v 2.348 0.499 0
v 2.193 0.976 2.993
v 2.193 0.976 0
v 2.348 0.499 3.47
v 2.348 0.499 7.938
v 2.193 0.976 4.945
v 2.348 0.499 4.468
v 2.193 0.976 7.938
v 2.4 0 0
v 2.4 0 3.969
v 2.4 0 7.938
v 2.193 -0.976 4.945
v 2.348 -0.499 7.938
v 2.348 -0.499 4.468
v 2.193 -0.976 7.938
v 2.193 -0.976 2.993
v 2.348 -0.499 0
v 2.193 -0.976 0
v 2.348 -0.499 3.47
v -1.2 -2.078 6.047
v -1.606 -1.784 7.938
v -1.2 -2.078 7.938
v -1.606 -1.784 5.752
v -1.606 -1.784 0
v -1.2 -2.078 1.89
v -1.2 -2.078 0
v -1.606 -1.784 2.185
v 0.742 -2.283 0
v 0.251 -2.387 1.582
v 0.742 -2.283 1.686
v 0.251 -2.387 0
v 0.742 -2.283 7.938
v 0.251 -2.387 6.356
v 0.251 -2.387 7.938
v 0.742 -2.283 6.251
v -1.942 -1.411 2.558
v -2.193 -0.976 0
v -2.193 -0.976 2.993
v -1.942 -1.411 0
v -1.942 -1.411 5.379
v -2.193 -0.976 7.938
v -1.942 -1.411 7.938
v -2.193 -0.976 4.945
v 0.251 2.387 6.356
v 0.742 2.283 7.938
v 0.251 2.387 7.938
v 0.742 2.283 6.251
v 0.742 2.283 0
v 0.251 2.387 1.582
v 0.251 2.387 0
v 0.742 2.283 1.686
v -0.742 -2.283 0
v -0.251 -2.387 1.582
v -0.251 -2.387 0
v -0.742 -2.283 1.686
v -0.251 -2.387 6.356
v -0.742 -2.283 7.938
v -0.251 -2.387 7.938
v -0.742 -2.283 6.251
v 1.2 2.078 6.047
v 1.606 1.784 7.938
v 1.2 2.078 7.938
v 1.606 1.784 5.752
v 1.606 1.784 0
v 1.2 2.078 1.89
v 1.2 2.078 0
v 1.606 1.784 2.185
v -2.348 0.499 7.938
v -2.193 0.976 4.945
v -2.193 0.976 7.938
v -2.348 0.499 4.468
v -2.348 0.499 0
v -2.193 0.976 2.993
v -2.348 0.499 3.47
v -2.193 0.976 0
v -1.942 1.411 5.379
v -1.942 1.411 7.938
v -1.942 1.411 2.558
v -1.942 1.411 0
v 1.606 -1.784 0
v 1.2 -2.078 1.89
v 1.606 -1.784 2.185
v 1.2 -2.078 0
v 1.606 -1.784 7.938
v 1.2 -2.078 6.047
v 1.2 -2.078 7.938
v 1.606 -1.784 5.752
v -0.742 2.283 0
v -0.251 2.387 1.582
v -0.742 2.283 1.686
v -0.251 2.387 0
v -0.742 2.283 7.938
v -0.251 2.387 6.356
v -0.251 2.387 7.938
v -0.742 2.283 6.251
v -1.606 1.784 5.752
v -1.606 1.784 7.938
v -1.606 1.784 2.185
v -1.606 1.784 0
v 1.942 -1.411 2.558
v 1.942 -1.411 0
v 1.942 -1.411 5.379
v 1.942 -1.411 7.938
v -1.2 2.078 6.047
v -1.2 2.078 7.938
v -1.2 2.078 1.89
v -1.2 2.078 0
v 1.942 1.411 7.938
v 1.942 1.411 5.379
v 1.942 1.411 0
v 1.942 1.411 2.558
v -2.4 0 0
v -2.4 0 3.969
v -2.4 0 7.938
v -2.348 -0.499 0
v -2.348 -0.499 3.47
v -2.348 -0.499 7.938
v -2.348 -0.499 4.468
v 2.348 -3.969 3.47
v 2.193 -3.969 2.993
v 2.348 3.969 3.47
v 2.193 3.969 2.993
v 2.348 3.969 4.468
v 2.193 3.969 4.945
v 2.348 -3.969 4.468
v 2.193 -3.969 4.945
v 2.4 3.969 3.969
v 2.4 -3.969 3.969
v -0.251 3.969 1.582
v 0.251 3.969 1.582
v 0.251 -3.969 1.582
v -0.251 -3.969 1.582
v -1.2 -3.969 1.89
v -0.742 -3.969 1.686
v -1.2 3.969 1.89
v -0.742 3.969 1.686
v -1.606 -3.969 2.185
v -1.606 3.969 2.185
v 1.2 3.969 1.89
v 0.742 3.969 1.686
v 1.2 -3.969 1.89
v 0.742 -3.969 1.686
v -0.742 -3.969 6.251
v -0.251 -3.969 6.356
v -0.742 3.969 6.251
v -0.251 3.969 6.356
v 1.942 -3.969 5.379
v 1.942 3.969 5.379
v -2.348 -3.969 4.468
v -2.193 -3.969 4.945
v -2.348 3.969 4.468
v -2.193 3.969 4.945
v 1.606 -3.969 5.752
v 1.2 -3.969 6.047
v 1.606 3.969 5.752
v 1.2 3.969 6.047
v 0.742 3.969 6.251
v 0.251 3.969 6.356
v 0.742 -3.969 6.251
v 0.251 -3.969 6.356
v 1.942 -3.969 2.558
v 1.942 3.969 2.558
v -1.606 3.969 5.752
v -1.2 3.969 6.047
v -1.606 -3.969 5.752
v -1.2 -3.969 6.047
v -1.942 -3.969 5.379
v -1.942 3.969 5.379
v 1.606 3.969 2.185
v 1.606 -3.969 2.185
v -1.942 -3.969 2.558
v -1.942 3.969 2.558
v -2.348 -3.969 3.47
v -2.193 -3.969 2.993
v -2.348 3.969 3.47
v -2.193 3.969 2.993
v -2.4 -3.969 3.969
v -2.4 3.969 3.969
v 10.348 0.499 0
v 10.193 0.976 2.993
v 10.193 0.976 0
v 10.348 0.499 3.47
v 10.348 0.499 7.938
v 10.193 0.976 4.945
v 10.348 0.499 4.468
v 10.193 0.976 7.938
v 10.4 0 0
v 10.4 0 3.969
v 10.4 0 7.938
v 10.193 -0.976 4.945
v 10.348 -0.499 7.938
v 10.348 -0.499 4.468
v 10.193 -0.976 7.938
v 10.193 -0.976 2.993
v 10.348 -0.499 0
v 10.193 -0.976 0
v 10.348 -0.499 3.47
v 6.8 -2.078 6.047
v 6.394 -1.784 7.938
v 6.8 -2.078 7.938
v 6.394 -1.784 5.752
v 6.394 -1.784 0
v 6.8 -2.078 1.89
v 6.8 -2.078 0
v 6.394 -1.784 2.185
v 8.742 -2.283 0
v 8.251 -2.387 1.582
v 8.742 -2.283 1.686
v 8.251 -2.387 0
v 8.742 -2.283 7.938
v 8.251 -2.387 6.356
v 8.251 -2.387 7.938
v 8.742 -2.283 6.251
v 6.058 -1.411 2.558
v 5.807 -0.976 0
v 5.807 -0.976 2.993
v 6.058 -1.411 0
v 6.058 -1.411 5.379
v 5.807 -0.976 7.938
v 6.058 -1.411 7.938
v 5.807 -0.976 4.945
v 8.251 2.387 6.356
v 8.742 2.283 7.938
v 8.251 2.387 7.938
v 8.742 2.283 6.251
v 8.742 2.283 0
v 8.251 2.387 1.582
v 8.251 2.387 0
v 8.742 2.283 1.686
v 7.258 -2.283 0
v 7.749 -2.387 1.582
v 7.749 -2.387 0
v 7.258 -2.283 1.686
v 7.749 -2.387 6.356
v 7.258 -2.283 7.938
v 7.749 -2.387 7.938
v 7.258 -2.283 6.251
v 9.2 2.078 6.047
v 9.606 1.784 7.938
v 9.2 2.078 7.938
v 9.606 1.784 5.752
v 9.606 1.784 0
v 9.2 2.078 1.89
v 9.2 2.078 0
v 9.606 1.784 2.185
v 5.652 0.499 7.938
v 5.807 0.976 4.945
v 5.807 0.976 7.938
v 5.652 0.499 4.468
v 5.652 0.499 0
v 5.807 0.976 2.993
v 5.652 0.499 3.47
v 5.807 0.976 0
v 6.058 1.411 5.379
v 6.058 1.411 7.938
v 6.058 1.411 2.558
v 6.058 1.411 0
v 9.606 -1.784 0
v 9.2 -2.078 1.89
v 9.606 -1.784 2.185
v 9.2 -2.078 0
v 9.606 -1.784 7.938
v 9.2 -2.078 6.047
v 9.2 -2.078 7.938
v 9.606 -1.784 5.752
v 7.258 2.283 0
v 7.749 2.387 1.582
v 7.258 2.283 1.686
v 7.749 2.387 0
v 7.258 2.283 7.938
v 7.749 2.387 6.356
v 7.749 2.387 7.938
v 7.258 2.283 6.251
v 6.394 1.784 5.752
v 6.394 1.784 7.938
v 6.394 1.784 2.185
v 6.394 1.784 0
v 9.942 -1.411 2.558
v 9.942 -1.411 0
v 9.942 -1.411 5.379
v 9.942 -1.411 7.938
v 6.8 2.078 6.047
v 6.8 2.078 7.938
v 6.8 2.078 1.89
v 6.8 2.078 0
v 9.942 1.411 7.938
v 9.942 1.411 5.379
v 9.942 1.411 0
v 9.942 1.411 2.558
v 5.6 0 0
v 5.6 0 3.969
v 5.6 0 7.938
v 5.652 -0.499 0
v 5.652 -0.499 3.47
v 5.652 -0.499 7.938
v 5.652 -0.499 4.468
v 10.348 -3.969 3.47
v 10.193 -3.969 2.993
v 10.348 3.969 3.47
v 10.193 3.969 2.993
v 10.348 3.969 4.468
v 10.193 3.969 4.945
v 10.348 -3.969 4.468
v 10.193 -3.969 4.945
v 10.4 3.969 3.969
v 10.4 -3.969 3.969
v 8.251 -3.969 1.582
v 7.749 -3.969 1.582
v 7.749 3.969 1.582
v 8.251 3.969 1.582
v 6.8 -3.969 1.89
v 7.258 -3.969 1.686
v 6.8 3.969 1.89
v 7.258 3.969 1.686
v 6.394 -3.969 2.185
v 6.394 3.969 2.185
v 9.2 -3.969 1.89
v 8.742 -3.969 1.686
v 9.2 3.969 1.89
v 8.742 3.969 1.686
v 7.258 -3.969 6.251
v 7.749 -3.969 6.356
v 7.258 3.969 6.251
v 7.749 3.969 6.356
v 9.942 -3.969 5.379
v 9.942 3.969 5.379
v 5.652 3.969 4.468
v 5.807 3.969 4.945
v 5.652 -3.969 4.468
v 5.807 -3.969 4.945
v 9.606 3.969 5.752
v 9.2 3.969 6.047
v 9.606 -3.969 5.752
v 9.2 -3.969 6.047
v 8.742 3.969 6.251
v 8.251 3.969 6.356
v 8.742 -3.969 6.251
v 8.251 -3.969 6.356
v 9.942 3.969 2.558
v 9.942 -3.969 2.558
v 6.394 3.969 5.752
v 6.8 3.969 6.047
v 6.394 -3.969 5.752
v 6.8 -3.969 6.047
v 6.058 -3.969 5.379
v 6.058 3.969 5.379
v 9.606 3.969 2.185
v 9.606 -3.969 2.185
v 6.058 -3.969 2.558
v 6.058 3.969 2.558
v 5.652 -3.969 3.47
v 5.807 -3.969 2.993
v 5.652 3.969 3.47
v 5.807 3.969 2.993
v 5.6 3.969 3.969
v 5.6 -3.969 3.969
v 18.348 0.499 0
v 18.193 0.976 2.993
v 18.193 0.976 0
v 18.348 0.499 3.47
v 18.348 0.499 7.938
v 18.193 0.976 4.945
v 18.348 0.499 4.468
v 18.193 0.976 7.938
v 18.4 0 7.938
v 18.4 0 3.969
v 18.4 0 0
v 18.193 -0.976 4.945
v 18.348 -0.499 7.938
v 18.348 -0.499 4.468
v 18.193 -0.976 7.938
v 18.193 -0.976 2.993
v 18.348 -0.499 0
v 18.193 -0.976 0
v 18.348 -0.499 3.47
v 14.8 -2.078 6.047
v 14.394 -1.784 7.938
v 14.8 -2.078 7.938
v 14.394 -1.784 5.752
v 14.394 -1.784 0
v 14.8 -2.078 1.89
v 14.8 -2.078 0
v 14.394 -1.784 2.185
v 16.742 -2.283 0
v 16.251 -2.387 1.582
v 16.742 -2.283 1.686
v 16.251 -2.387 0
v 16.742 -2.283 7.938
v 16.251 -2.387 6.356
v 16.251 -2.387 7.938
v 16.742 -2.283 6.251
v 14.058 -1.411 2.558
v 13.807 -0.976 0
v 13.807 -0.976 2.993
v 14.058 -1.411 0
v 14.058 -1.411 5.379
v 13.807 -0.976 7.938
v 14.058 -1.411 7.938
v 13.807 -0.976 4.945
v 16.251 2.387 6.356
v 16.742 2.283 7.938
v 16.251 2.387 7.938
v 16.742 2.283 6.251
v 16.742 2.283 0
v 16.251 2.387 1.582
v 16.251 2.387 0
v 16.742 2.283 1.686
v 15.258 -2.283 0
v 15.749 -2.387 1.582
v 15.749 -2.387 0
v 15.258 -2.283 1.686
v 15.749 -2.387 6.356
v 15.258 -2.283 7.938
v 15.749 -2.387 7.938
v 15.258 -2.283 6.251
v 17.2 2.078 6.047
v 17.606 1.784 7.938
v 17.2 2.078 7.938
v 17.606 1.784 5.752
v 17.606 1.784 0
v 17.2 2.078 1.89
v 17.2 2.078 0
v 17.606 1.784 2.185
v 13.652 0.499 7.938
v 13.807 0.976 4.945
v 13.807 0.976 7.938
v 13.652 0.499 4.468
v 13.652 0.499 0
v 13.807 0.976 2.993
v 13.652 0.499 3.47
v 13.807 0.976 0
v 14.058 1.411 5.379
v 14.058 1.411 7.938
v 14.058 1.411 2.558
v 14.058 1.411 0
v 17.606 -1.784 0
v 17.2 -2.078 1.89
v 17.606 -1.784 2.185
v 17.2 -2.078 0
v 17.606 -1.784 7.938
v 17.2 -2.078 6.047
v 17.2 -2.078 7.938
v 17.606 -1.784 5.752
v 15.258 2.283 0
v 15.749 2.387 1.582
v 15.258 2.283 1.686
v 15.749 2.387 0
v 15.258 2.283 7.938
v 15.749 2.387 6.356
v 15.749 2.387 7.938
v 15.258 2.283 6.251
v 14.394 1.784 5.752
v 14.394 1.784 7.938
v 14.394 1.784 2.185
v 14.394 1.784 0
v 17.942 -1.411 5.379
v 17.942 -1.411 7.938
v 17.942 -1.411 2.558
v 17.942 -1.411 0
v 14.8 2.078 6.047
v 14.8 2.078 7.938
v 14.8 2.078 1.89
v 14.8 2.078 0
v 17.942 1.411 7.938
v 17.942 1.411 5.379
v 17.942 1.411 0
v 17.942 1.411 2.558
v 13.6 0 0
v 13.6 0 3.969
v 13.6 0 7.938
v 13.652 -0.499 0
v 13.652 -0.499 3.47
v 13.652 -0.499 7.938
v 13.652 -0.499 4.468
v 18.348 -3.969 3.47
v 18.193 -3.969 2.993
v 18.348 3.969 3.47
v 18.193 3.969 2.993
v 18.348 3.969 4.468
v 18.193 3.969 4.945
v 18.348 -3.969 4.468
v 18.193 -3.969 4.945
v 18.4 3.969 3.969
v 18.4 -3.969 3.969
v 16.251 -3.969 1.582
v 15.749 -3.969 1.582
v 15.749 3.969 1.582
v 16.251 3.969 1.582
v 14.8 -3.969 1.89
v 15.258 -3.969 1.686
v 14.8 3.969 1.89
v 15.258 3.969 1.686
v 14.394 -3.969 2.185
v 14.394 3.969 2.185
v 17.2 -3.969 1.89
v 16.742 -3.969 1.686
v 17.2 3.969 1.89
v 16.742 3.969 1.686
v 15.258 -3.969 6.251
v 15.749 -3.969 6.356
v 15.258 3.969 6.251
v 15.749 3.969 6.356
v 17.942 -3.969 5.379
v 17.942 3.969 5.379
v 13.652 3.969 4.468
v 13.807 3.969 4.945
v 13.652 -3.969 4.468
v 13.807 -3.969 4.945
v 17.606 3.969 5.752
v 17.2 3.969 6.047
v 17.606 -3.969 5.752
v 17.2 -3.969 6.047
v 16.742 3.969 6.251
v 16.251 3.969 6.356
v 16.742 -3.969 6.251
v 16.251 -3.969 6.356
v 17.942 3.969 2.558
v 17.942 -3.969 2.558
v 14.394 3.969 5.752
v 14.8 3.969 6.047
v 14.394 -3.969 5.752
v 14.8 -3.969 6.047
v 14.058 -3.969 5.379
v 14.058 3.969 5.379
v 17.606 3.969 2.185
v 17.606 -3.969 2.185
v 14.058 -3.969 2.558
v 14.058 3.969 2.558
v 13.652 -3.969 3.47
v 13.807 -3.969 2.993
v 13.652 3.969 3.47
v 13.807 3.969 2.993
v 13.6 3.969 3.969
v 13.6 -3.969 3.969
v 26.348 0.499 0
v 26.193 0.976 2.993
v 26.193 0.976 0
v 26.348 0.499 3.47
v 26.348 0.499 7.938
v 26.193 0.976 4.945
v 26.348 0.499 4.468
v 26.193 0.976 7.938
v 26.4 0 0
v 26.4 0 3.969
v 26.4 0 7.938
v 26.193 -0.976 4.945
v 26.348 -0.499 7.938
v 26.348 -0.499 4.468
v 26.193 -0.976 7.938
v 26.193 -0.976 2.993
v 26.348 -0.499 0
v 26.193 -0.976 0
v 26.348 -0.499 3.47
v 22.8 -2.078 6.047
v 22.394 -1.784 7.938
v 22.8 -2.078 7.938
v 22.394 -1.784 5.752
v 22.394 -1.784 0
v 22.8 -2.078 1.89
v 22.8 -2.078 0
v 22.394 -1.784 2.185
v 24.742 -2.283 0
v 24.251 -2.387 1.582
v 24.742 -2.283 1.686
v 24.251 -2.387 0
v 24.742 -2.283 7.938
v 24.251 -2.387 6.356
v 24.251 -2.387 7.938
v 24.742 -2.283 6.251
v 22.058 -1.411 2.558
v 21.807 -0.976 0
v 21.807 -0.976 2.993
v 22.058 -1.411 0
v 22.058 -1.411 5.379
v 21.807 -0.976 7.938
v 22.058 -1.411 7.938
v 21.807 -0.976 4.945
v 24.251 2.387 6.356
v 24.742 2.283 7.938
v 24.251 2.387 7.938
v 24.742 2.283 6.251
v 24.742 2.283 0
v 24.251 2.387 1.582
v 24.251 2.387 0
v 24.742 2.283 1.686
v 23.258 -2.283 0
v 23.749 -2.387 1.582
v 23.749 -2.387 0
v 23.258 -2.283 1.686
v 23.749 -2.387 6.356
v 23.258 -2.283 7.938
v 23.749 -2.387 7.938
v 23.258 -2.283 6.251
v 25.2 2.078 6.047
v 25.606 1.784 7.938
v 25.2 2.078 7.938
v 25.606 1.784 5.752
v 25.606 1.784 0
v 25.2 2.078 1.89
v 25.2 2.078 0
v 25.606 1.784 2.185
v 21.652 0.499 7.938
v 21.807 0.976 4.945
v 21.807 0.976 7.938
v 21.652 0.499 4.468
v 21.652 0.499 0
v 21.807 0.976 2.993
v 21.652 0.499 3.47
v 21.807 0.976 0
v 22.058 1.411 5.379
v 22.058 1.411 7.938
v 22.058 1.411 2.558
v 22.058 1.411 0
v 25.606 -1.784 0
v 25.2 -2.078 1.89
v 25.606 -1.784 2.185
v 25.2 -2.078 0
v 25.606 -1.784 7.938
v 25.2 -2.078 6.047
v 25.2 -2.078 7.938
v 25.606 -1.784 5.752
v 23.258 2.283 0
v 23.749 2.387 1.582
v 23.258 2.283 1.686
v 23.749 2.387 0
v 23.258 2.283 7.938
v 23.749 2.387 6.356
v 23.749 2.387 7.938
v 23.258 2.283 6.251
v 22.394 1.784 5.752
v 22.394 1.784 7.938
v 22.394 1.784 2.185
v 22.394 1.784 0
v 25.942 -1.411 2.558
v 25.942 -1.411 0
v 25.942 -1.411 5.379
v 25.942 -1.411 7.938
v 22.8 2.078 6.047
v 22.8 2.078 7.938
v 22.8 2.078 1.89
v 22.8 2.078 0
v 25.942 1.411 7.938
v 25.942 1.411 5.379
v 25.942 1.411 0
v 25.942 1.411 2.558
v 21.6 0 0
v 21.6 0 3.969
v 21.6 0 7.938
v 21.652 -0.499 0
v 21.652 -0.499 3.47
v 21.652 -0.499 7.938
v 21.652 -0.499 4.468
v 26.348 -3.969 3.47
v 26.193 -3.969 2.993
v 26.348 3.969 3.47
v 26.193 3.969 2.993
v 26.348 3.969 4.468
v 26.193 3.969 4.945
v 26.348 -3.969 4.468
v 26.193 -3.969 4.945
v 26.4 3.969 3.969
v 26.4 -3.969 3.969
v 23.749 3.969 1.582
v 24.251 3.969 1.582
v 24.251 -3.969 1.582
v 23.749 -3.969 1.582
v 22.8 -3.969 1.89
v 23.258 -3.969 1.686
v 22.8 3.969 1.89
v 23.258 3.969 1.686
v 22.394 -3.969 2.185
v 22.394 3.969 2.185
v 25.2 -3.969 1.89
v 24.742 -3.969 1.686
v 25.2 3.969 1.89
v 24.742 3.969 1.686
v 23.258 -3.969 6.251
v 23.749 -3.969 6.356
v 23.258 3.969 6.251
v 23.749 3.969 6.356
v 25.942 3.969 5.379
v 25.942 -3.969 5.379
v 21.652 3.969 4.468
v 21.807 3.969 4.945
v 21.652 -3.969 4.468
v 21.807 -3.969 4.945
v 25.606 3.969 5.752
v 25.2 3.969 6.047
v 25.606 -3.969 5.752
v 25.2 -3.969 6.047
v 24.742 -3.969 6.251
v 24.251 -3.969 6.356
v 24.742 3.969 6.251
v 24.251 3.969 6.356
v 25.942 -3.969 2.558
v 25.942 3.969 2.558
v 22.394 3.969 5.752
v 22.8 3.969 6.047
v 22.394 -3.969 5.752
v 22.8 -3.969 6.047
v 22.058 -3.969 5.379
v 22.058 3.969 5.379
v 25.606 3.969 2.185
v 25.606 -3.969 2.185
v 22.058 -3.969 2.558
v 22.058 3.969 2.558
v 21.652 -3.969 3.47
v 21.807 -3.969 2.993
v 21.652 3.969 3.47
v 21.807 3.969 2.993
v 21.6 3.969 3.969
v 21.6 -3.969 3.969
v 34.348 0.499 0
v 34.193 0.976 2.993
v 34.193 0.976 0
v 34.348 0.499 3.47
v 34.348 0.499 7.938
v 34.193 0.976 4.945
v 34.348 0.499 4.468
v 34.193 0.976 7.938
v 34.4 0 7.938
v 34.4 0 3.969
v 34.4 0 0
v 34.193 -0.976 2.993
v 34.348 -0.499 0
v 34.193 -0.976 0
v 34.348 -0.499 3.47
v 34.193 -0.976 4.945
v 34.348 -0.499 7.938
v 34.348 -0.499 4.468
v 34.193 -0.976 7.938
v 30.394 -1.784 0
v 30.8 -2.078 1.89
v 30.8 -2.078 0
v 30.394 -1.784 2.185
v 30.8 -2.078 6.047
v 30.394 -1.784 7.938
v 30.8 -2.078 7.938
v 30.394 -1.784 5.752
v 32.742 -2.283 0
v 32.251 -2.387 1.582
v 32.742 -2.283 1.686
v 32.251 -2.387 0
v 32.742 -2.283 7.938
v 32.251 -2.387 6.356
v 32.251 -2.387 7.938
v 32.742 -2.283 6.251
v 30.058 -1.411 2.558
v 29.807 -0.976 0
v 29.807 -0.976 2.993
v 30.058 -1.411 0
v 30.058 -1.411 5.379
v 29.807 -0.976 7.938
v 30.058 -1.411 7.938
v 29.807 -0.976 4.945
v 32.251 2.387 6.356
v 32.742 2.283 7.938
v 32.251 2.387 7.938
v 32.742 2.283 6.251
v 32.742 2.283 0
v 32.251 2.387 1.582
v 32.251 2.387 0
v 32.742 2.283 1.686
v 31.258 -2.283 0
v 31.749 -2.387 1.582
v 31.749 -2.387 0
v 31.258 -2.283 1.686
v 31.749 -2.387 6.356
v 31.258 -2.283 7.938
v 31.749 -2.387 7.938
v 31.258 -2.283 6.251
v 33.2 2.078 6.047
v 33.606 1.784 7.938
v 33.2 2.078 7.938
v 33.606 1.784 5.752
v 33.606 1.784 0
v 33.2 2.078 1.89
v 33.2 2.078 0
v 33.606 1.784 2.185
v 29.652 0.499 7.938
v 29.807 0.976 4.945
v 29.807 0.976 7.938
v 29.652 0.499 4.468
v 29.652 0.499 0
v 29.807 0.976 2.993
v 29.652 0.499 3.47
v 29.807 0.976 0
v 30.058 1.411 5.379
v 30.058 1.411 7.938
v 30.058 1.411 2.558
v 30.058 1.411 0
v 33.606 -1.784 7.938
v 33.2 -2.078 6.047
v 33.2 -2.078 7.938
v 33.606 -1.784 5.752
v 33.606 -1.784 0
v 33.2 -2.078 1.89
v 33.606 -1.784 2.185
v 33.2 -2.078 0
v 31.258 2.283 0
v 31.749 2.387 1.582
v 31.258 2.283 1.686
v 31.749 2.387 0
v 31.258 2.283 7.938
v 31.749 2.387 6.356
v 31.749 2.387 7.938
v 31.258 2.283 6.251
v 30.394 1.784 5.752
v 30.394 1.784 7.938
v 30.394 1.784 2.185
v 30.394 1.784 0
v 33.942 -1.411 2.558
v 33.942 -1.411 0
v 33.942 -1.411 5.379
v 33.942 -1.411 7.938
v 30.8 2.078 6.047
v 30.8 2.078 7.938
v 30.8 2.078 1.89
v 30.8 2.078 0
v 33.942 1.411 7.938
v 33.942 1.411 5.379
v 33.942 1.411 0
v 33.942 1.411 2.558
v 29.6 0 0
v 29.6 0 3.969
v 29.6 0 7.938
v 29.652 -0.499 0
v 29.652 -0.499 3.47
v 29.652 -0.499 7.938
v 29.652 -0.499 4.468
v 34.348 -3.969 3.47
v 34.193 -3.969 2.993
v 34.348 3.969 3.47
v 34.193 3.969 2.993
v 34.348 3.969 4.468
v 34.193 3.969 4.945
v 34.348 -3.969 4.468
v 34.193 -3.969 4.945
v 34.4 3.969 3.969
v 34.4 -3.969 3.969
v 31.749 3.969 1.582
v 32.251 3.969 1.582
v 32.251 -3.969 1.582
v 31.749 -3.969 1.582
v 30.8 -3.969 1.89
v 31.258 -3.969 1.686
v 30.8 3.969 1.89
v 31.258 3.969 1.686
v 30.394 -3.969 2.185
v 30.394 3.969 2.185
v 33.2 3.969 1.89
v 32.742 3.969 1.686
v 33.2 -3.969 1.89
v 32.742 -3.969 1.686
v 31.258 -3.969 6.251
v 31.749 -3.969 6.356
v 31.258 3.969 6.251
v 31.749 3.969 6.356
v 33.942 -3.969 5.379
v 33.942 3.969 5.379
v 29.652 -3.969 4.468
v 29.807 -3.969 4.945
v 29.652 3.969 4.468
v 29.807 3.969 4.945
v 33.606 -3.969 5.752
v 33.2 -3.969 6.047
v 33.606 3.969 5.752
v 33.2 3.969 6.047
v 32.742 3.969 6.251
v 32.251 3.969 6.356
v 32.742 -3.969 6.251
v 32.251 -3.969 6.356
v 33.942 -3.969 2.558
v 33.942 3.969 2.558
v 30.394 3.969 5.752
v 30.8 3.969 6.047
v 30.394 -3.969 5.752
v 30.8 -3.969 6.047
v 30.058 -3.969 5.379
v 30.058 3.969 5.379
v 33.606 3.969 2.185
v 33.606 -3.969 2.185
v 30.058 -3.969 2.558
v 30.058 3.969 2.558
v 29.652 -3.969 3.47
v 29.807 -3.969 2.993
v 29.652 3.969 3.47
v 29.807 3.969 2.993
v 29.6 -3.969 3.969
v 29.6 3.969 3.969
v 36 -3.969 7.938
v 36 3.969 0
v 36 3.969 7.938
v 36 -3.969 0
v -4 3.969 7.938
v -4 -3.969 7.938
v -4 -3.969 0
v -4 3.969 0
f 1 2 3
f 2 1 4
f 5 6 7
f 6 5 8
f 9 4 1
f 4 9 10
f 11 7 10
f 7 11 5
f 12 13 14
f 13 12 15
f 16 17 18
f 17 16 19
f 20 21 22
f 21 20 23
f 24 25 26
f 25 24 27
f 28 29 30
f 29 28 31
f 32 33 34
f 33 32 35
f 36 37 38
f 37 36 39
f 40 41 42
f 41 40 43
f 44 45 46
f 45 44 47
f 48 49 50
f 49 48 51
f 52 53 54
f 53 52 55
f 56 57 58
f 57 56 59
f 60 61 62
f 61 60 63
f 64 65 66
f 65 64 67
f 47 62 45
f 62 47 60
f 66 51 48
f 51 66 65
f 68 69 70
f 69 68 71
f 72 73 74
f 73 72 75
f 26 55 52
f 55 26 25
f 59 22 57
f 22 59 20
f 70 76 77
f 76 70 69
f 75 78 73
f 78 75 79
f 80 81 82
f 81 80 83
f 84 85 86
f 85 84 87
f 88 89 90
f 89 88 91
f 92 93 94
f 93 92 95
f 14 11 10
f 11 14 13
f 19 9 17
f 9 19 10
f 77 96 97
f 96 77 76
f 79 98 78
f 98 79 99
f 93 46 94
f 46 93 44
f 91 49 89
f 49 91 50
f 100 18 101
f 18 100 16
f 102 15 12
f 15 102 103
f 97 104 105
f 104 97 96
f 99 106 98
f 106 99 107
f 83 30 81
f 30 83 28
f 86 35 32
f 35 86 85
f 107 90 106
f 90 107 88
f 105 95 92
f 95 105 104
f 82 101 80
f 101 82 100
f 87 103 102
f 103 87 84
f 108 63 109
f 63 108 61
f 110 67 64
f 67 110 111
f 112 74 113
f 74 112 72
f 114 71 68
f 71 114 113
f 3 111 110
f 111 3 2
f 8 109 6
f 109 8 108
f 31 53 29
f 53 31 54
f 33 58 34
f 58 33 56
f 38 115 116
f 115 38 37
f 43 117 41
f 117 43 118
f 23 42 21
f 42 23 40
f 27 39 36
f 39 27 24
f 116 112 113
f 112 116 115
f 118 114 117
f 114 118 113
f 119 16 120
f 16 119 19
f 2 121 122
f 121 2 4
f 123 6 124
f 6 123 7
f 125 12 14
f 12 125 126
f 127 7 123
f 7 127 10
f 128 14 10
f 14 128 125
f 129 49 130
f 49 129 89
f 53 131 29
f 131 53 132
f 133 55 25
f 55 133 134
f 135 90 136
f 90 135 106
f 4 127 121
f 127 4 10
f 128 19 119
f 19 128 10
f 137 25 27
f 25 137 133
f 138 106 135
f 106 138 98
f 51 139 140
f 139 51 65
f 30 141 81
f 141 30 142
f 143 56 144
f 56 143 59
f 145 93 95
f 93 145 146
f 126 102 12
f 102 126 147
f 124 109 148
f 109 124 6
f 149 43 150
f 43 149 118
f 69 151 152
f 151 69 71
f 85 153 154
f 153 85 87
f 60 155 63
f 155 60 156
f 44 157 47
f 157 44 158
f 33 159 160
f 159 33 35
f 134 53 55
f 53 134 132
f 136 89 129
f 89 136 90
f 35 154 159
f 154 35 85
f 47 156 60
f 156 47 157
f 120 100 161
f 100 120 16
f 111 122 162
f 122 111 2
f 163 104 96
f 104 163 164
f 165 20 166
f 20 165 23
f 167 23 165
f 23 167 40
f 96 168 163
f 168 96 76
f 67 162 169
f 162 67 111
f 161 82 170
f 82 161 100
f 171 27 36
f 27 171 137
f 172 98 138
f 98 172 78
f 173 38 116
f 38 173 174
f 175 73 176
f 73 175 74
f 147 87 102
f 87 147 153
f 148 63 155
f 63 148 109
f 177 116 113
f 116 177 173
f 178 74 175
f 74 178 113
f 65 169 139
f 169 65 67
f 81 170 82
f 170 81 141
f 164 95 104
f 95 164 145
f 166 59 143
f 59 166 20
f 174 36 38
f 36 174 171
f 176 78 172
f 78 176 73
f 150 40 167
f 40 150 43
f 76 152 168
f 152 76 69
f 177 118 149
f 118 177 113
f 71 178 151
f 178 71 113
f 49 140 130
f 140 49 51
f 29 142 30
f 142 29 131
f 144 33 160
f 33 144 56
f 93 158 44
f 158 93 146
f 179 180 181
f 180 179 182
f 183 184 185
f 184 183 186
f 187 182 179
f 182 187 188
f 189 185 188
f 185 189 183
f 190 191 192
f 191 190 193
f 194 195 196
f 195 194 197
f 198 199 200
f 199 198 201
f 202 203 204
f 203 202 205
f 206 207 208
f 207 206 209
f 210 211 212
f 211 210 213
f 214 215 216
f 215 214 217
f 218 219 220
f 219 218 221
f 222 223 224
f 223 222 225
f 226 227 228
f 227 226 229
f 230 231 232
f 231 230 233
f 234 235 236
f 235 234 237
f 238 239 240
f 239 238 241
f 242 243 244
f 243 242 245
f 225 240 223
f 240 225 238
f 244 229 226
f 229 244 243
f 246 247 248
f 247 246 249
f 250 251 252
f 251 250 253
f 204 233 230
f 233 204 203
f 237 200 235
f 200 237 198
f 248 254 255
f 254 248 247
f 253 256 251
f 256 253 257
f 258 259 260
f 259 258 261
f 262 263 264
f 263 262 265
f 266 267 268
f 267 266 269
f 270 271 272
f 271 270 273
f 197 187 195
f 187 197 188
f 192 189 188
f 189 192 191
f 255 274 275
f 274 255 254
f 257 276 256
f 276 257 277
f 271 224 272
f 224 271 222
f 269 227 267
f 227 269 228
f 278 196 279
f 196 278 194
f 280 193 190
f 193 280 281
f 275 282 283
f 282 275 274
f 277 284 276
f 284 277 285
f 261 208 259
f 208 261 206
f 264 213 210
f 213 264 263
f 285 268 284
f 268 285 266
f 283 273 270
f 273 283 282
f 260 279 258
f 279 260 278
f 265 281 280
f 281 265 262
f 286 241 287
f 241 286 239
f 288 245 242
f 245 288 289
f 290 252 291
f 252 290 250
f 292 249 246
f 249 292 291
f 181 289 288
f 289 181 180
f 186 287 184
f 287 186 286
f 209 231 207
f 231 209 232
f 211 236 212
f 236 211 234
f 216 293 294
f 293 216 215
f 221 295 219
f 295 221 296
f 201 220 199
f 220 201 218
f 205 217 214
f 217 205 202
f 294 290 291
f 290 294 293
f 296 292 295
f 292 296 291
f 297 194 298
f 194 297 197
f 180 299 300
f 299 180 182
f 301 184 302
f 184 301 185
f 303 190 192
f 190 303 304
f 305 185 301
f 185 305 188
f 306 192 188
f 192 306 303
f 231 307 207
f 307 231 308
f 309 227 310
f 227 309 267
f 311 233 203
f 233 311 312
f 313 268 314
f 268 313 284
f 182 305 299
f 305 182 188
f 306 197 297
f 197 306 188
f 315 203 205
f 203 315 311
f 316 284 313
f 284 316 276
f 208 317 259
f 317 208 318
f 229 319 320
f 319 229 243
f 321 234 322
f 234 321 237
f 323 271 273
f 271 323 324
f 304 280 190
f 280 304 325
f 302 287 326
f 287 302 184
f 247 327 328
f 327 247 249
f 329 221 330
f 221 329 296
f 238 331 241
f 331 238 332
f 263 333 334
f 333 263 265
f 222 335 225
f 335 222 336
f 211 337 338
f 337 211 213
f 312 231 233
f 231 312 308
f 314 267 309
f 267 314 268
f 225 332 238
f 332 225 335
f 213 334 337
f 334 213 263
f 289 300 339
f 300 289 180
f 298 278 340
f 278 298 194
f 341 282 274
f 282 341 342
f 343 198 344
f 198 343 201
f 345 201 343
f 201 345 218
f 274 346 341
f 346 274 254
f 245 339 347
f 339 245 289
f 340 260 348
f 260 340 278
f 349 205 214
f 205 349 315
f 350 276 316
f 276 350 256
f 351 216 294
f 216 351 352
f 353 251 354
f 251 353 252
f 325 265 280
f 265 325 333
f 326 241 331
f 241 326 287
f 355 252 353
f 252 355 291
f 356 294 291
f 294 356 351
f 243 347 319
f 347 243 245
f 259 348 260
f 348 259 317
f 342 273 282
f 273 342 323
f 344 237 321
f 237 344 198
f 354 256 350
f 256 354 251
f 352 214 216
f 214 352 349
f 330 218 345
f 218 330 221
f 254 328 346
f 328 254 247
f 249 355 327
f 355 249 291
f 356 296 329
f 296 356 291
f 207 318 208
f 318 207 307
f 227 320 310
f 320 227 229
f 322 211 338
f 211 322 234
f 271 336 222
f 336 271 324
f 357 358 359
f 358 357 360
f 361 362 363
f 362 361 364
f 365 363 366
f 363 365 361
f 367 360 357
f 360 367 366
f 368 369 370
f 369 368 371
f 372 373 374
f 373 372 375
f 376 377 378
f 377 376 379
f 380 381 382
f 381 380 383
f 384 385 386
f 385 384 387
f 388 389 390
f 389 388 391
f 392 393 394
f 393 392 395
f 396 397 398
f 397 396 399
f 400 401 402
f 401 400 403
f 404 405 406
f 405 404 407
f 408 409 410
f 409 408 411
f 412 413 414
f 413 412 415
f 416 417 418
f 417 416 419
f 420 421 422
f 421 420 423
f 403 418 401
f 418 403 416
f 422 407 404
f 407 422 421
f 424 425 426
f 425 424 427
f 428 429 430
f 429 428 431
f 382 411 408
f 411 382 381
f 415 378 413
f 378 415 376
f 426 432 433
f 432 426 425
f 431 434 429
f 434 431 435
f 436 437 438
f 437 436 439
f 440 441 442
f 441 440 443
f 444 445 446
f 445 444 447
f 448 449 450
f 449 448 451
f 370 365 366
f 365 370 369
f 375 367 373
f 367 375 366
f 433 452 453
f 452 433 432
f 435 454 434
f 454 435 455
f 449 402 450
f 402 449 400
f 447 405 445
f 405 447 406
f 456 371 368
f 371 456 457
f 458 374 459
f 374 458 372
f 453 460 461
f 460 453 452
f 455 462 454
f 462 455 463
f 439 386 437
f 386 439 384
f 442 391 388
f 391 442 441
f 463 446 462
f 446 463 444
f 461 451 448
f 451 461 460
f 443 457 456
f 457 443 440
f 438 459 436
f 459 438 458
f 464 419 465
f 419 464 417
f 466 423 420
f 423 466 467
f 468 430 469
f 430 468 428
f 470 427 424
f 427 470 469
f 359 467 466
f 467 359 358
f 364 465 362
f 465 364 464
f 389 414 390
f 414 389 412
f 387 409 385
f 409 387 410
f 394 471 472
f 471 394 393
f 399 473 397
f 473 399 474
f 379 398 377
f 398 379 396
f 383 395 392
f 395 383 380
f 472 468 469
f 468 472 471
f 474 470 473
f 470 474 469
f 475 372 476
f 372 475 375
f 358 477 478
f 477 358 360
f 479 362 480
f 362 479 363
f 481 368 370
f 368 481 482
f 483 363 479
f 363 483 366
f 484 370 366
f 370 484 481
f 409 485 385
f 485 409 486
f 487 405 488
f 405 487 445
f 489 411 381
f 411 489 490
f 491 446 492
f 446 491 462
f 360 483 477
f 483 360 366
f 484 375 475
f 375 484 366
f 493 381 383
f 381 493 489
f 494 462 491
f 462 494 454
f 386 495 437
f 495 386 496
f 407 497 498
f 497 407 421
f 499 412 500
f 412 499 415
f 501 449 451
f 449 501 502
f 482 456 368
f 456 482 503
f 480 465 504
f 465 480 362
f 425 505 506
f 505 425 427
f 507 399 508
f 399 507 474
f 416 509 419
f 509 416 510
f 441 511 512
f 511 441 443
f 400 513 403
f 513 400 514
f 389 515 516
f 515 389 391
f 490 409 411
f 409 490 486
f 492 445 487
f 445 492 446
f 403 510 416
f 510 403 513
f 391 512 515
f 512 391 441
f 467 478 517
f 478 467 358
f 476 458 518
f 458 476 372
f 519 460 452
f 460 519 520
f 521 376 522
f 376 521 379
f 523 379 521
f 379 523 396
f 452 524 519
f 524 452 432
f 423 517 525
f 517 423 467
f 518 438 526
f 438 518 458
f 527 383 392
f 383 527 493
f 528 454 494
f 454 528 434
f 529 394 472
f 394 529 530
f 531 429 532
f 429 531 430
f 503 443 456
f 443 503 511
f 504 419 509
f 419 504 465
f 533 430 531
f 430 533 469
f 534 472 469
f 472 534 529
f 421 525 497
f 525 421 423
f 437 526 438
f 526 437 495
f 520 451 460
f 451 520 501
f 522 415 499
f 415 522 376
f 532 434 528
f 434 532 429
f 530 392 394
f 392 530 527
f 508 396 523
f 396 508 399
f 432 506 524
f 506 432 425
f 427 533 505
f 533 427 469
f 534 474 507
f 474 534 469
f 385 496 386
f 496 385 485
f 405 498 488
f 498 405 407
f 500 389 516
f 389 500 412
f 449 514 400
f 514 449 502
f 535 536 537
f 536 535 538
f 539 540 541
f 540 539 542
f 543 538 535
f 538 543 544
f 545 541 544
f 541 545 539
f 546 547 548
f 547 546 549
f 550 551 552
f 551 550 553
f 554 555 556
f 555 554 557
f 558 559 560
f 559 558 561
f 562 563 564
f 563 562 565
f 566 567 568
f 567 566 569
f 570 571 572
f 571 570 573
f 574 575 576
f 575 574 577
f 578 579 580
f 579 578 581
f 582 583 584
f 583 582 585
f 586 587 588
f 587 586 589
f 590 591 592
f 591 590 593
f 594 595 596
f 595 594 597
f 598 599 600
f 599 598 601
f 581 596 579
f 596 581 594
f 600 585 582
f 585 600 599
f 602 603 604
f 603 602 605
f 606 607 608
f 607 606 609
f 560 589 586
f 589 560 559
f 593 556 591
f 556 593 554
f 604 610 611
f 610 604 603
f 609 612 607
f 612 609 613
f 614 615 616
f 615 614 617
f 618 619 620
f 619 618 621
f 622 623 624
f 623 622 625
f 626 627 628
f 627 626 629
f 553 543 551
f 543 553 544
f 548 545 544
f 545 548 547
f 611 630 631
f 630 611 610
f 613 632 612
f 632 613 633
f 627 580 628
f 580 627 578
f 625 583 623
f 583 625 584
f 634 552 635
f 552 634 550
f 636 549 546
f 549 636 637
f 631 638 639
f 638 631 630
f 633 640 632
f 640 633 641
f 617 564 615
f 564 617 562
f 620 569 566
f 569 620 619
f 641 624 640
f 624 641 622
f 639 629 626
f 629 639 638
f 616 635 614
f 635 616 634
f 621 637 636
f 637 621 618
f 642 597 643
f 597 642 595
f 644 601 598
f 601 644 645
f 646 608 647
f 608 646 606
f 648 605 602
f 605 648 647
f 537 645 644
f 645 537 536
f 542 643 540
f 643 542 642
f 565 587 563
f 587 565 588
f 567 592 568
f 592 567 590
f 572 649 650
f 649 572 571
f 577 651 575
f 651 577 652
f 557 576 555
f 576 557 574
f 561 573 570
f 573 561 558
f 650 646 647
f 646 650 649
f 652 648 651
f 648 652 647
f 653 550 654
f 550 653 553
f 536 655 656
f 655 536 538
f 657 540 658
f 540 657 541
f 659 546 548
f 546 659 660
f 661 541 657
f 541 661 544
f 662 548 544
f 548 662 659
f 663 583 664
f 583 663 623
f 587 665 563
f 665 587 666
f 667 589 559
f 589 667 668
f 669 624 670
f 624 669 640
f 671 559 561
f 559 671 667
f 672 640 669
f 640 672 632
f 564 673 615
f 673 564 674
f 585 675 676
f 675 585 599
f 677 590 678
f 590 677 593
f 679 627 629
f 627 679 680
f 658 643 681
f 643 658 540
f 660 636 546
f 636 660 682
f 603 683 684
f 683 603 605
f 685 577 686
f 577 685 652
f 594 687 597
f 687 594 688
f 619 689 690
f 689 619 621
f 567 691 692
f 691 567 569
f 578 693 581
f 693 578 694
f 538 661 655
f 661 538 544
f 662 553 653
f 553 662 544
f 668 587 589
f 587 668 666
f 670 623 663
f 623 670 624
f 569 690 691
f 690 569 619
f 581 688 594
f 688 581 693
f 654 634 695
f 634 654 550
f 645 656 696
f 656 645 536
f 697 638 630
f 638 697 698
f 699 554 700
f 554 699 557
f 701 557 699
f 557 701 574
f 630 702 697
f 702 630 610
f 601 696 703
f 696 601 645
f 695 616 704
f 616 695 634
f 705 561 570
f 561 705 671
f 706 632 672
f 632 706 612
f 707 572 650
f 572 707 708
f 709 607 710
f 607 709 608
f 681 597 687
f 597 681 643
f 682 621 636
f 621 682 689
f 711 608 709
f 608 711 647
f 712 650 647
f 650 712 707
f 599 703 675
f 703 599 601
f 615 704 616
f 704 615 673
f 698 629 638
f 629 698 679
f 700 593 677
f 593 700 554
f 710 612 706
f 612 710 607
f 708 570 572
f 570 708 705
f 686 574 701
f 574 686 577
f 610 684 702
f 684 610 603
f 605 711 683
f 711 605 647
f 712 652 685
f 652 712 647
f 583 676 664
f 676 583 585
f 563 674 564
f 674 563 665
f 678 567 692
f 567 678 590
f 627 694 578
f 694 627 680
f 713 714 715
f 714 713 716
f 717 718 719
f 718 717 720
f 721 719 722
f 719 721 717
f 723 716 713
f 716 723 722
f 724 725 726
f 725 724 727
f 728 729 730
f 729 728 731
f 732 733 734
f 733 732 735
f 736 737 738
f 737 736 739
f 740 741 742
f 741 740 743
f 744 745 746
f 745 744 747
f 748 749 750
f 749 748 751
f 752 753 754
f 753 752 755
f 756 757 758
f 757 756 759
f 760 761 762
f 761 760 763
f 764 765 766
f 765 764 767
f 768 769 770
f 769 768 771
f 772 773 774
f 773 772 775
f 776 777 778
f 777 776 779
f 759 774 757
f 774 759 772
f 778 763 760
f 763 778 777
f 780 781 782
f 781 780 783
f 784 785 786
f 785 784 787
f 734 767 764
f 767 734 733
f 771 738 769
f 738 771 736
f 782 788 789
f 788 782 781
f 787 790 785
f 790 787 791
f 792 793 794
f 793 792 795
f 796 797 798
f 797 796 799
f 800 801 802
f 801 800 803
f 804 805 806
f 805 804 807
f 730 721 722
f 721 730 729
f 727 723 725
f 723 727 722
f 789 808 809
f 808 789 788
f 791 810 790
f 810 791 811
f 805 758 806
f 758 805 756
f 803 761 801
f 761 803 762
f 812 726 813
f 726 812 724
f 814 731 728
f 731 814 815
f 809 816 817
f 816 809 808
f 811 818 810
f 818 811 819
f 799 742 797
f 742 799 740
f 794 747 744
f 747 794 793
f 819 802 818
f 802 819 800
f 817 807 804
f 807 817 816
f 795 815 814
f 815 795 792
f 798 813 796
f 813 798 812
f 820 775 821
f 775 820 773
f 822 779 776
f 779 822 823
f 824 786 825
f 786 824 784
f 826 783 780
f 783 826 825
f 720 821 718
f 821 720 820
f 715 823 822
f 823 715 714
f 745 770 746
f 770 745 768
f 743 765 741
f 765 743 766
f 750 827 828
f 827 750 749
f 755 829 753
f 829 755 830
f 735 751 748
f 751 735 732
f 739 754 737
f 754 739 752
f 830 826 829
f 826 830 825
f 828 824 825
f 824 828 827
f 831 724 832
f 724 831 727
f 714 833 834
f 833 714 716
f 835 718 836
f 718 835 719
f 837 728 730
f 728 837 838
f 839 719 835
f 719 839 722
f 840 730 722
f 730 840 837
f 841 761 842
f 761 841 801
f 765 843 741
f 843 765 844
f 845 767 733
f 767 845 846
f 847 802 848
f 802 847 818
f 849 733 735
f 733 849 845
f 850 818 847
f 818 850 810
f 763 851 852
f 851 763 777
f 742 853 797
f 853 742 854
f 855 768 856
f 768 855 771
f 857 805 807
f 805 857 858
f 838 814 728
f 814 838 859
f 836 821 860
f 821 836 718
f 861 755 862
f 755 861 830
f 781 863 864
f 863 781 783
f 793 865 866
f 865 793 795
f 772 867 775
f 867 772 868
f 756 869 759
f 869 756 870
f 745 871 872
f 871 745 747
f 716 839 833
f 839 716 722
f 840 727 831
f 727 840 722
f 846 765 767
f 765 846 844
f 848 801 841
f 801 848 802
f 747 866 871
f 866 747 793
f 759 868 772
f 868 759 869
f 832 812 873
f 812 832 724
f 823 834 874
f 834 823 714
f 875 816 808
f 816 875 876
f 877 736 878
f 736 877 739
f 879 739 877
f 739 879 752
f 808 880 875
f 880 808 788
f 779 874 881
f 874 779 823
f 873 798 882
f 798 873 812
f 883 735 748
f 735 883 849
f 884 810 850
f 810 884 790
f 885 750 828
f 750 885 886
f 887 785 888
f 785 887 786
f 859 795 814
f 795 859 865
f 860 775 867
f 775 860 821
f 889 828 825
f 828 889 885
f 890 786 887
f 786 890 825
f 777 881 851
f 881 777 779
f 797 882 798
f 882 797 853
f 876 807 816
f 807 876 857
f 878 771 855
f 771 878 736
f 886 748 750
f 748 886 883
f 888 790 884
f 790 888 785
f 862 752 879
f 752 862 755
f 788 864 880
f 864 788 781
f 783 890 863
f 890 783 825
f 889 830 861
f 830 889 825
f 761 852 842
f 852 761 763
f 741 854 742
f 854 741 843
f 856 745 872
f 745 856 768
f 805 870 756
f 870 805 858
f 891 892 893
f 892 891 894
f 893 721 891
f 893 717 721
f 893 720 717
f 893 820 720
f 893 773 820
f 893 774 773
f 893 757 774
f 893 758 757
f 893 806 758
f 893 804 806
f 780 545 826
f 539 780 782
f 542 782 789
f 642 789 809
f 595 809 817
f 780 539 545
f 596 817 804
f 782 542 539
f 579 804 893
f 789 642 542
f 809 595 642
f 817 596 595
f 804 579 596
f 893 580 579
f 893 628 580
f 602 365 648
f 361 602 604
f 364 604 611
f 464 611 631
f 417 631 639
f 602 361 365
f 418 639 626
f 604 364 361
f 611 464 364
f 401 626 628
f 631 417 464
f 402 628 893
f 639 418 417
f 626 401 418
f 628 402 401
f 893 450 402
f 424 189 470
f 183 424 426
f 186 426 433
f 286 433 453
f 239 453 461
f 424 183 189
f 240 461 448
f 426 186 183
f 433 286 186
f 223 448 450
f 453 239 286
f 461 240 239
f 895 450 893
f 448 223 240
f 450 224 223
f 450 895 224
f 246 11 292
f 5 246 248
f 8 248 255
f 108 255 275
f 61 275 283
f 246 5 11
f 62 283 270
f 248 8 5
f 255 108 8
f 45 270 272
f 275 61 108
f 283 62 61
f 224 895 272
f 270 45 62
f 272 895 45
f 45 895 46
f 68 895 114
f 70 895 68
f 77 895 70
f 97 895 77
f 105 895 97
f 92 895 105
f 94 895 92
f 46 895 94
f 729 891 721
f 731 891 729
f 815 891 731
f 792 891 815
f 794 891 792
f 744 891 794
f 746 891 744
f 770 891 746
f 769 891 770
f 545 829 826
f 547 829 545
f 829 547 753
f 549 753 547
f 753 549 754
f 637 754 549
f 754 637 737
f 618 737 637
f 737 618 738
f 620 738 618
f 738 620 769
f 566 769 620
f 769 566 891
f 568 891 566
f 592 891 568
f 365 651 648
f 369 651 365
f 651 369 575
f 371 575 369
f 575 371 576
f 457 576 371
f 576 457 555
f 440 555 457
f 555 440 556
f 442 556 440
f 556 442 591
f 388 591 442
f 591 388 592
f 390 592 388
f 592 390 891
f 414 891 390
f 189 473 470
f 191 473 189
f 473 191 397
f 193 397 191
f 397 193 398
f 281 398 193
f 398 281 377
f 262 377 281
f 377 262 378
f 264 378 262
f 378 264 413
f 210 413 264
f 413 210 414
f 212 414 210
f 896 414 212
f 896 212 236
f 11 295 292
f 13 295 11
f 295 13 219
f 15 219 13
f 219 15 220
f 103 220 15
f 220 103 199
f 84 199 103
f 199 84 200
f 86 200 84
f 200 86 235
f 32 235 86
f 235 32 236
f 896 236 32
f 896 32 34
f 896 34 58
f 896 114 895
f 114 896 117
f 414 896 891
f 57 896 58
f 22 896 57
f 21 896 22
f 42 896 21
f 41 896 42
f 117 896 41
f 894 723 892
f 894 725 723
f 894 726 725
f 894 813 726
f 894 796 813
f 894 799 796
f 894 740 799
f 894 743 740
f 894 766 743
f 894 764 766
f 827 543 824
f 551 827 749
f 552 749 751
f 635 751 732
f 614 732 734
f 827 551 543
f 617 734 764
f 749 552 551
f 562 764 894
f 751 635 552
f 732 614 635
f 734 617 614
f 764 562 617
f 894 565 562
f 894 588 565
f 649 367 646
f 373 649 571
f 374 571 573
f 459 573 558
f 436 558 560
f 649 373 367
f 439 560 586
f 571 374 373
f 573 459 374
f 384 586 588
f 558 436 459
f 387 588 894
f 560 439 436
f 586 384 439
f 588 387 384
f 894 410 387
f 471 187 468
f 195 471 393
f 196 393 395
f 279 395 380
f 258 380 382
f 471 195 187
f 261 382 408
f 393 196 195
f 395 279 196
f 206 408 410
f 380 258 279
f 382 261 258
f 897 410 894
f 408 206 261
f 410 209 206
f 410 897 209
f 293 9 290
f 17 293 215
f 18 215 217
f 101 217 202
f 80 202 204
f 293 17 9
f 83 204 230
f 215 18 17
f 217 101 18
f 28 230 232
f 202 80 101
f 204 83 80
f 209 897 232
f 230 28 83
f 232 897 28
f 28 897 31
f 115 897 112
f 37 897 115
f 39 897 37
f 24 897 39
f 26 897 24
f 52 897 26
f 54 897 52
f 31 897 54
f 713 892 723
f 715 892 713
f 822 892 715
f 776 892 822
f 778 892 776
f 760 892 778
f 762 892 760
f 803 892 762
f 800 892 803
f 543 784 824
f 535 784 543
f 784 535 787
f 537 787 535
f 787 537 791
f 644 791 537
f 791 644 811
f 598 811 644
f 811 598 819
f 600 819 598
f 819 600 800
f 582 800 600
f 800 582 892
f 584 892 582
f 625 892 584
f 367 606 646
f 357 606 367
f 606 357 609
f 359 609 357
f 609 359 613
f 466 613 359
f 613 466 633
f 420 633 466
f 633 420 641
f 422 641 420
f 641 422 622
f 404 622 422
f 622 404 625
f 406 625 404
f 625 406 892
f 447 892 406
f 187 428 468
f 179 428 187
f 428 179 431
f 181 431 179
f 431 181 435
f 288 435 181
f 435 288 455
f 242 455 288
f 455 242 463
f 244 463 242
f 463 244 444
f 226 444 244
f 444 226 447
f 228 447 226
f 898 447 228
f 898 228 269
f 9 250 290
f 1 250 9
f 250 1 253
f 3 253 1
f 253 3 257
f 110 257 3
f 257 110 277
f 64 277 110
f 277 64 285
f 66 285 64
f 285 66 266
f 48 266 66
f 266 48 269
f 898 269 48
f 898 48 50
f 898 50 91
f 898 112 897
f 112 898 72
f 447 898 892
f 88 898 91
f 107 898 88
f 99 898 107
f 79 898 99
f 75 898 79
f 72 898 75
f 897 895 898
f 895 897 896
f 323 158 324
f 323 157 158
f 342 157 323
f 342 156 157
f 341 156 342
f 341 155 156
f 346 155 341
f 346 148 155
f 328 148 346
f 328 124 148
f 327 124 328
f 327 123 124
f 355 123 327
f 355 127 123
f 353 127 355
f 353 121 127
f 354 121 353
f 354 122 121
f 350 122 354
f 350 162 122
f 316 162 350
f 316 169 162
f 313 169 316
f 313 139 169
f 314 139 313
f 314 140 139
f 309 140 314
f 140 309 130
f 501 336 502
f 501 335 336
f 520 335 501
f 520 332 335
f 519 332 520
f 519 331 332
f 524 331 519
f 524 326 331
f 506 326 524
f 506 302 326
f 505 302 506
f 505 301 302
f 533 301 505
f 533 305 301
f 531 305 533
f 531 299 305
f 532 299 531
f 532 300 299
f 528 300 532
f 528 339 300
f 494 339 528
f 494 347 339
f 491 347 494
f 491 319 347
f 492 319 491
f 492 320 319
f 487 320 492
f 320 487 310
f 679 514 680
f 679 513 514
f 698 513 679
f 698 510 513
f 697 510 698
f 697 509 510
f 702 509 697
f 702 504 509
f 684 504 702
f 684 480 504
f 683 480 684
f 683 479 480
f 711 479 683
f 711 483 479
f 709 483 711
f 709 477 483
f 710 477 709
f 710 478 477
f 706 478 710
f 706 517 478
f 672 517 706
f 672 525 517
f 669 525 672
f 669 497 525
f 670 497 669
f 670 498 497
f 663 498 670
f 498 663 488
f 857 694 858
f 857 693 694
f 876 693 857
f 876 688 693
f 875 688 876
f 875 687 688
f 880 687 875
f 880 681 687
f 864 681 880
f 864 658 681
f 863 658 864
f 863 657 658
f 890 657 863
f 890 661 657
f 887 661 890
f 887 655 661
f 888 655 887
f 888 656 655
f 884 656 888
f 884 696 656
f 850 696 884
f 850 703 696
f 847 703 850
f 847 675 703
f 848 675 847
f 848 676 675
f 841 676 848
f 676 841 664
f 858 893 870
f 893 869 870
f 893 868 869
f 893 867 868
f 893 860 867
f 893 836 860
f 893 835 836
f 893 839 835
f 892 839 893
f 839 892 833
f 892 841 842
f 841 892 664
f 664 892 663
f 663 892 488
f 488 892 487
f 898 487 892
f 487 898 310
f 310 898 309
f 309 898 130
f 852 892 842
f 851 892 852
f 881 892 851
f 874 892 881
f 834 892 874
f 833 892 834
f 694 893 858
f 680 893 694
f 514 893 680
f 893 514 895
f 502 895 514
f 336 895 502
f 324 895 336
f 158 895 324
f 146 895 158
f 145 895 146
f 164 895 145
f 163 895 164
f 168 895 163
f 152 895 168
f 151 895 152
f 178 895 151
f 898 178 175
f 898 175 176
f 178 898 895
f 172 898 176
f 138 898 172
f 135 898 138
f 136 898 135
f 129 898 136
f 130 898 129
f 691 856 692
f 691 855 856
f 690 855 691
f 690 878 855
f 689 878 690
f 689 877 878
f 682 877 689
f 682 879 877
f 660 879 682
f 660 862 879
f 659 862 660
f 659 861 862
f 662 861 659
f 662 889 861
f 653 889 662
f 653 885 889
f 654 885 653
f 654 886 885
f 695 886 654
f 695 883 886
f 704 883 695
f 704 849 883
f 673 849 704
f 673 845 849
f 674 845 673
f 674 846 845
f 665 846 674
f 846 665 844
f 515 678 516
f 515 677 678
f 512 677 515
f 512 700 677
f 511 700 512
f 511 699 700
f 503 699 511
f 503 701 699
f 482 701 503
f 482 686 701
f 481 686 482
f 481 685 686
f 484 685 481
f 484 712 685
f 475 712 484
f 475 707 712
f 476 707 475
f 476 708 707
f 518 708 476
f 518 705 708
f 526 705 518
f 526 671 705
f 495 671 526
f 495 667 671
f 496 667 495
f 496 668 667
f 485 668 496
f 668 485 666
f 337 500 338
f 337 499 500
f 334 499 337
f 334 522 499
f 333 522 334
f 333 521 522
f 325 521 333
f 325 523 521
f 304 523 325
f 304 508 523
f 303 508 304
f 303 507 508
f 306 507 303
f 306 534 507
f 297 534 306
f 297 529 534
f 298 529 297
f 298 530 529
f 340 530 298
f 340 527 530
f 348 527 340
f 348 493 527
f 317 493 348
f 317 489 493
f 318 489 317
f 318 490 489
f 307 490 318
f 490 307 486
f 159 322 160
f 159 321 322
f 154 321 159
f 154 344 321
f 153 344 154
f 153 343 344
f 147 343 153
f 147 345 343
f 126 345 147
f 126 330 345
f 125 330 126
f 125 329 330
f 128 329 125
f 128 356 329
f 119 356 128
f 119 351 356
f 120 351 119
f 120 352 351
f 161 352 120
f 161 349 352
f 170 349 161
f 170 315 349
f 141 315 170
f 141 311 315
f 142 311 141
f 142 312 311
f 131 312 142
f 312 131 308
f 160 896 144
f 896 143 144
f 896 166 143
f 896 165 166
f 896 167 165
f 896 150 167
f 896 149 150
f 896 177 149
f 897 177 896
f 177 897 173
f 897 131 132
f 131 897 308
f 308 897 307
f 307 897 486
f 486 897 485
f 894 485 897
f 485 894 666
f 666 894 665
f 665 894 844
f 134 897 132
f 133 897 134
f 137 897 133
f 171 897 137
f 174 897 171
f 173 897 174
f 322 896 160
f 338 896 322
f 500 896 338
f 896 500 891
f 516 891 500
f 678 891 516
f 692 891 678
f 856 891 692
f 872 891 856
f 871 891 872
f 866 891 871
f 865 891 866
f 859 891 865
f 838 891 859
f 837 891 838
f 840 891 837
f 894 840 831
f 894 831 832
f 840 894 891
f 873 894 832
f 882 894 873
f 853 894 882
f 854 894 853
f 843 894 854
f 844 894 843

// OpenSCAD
// Description: "Lego-compatible grid beam"
// Project home: http://bitbeam.org

// Each bitbeam is 5/16 inches wide. It's length is determined by the number of holes.
// Each hole is 8mm apart from each other
// The center of holes are about 4mm (technically 5/32 inches) way from each side of the beam.
// The holes are 4.8 mm in diameter.

beam_width = 7.9375;   // 5/16 inches

module beam(number_of_holes) {
    beam_length = number_of_holes * 8;
        difference(){
            // Draw the beam
            translate([-4, -beam_width/2,0])
            cube(size=[beam_length, beam_width, beam_width]);
    
            // Cut the holes
            for (x=[4 : 8 : beam_length]) {
              translate([x-4, 0, 0]){
                translate([0, 0, -1]){
                  cylinder(r=2.4, h=beam_width+2, $fn=30);
                 }
                rotate(a=[90, 0, 0]) {
                  translate([0, beam_width/2, -beam_width/2-1]){
                    cylinder(r=2.4, h=beam_width+2, $fn=30); 
                  }
                }
              }
           }
        }
}


module beam_to(start=[0,0,0], length=5, direction=[0,0,0]){
  translate(start * beam_width){
    rotate(direction){
     beam(length);
	}
  }
}

beam_to();
